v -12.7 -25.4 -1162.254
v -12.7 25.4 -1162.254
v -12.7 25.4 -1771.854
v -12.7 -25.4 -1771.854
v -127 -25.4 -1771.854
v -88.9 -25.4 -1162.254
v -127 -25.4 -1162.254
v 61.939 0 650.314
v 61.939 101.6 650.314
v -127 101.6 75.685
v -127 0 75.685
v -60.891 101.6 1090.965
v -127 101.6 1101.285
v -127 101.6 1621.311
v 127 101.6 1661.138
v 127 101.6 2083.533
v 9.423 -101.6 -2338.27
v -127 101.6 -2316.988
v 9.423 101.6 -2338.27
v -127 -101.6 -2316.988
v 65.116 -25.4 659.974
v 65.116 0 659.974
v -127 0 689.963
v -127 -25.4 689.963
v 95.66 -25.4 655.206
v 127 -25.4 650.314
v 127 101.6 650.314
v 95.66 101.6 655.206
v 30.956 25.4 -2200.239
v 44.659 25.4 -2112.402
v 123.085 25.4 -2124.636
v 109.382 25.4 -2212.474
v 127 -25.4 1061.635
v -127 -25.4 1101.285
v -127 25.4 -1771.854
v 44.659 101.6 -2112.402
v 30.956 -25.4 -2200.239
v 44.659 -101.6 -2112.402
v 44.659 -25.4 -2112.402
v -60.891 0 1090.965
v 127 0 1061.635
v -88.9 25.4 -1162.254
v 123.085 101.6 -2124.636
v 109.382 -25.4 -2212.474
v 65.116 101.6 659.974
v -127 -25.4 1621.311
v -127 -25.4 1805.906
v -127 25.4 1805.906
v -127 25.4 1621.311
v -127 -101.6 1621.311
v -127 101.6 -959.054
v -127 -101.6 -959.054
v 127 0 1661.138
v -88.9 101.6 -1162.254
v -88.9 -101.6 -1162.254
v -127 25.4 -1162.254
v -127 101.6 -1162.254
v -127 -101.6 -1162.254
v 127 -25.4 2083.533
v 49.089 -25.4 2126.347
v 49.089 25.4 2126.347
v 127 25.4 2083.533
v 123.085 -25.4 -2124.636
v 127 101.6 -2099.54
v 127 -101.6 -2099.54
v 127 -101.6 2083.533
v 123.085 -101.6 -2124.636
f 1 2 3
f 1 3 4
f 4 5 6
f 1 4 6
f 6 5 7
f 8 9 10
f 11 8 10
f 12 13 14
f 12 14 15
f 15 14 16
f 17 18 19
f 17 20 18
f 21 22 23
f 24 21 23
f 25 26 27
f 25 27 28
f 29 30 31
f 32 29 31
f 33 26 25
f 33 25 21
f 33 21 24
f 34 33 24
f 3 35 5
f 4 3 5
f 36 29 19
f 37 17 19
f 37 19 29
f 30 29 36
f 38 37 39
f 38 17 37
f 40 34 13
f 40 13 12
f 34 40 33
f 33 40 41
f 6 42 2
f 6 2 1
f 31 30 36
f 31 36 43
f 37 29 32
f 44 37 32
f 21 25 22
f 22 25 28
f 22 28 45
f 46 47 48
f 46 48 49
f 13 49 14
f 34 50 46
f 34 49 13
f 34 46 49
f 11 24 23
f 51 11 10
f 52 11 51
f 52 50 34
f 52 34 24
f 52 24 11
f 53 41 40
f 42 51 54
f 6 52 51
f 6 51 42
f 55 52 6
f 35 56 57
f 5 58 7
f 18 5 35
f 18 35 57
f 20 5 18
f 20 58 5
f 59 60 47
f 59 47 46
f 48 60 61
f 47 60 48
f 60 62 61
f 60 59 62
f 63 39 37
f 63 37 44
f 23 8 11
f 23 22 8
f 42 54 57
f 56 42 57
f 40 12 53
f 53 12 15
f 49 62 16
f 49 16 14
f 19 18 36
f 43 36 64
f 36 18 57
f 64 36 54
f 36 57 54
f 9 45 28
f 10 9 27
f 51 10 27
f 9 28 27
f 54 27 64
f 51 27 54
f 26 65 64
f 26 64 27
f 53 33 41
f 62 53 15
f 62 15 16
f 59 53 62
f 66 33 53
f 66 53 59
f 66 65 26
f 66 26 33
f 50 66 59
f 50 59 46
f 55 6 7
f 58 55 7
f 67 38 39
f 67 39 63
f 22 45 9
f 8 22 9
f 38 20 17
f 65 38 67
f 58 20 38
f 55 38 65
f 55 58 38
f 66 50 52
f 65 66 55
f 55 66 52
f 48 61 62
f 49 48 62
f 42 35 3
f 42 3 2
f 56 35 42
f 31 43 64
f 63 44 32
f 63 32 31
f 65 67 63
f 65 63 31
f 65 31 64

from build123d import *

# Parameters (mm, degrees)
F1_DEPTH = 101.6
F2_DEPTH = 25.4
F4_DEPTH = 127
F5_DEPTH = 101.6
F6_W     = 50.8
F6_H     = 609.6
F7_DEPTH = 114.3


# Not quite as in the source:
# - a feature names something its author has since deleted; it is built from what else it names


with BuildPart() as f1:
    # F0 (on Front) → F1 (new body, symmetric)
    with BuildSketch(Plane.XZ):
        Polygon((48.5735566343, -2087.3053811025), (-127, -2059.9159062675), (-127, -2316.988), (9.4230761062, -2338.2699998726), (30.9558403967, -2200.239459549), (44.6585085815, -2112.4018429795), align=None)
        Polygon((123.0849519472, -2124.6363681445), (127, -2099.5399062675), (48.5735566343, -2087.3053811025), (44.6585085815, -2112.4018429795), align=None)
        Polygon((127, -2099.5399062675), (127, -1584.5717697842), (48.5735566343, -2087.3053811025), align=None)
        Polygon((127, 2083.5330486298), (-127, 1621.3110685349), (-127, -959.054172039), (-88.9, -1162.254172039), (-127, -1162.254172039), (-127, -2059.9159062675), (48.5735566343, -2087.3053811025), (127, -1584.5717697842), (127, 1383.5908232688), align=None)
    extrude(amount=F1_DEPTH, both=True)

    # F0 (on Front) → F2 (join, symmetric)
    with BuildSketch(Plane.XZ):
        Polygon((109.3822837623, -2212.4739847141), (123.0849519472, -2124.6363681445), (44.6585085815, -2112.4018429795), (30.9558403967, -2200.239459549), align=None)
        Polygon((49.0886035459, 2126.3468817047), (-127, 1805.9058462593), (-127, 1621.3110685349), (127, 2083.5330486298), align=None)
    extrude(amount=F2_DEPTH, both=True)

    # F3 (on face) → F4 (cut)
    with BuildSketch(Plane(origin=(0, 101.6, 0), x_dir=(-1, 0, 0), z_dir=(0, 1, 0))):
        Polygon((-124.6851625392, 841.1452440828), (-65.1155717719, 659.9737911019), (127, 689.9630318555), (127, 890.3500338664), (125.3471307259, 895.3658269662), (-127, 855.9744398599), align=None)
        Polygon((127, 895.6238398599), (125.3471307259, 895.3658269662), (127, 890.3500338664), align=None)
        Polygon((-127, 1061.6352478643), (-127, 855.9744398599), (125.3471307259, 895.3658269662), (60.8907531403, 1090.9649944295), align=None)
        Polygon((60.8907531403, 1090.9649944295), (125.3471307259, 895.3658269662), (127, 895.6238398599), (127, 1101.2846478643), align=None)
        Polygon((-124.6851625392, 841.1452440828), (-95.6600158458, 655.2058033819), (-65.1155717719, 659.9737911019), align=None)
        Polygon((-127, 848.1854547136), (-127, 650.3136318555), (-95.6600158458, 655.2058033819), (-124.6851625392, 841.1452440828), align=None)
        Polygon((-127, 855.9744398599), (-127, 848.1854547136), (-124.6851625392, 841.1452440828), align=None)
    extrude(amount=-F4_DEPTH, mode=Mode.SUBTRACT)

    # F3 (on face) → F5 (cut)
    with BuildSketch(Plane(origin=(0, 101.6, 0), x_dir=(-1, 0, 0), z_dir=(0, 1, 0))):
        Polygon((127, 650.3136318555), (-61.9392891755, 650.3136318555), (127, 75.6847800506), align=None)
        Polygon((-65.1155717719, 659.9737911019), (-61.9392891755, 650.3136318555), (127, 650.3136318555), (127, 689.9630318555), align=None)
        Polygon((-127, 1661.1378192902), (-127, 1061.6352478643), (60.8907531403, 1090.9649944295), align=None)
    extrude(amount=-F5_DEPTH, mode=Mode.SUBTRACT)

    # F6 (on face) → F7 (cut)
    with BuildSketch(Plane(origin=(-127, 0, 0), x_dir=(0, -1, 0), z_dir=(-1, 0, 0))):
        with Locations((0, -1467.054172039)):
            Rectangle(F6_W, F6_H)
    extrude(amount=-F7_DEPTH, mode=Mode.SUBTRACT)


solid = f1.part
